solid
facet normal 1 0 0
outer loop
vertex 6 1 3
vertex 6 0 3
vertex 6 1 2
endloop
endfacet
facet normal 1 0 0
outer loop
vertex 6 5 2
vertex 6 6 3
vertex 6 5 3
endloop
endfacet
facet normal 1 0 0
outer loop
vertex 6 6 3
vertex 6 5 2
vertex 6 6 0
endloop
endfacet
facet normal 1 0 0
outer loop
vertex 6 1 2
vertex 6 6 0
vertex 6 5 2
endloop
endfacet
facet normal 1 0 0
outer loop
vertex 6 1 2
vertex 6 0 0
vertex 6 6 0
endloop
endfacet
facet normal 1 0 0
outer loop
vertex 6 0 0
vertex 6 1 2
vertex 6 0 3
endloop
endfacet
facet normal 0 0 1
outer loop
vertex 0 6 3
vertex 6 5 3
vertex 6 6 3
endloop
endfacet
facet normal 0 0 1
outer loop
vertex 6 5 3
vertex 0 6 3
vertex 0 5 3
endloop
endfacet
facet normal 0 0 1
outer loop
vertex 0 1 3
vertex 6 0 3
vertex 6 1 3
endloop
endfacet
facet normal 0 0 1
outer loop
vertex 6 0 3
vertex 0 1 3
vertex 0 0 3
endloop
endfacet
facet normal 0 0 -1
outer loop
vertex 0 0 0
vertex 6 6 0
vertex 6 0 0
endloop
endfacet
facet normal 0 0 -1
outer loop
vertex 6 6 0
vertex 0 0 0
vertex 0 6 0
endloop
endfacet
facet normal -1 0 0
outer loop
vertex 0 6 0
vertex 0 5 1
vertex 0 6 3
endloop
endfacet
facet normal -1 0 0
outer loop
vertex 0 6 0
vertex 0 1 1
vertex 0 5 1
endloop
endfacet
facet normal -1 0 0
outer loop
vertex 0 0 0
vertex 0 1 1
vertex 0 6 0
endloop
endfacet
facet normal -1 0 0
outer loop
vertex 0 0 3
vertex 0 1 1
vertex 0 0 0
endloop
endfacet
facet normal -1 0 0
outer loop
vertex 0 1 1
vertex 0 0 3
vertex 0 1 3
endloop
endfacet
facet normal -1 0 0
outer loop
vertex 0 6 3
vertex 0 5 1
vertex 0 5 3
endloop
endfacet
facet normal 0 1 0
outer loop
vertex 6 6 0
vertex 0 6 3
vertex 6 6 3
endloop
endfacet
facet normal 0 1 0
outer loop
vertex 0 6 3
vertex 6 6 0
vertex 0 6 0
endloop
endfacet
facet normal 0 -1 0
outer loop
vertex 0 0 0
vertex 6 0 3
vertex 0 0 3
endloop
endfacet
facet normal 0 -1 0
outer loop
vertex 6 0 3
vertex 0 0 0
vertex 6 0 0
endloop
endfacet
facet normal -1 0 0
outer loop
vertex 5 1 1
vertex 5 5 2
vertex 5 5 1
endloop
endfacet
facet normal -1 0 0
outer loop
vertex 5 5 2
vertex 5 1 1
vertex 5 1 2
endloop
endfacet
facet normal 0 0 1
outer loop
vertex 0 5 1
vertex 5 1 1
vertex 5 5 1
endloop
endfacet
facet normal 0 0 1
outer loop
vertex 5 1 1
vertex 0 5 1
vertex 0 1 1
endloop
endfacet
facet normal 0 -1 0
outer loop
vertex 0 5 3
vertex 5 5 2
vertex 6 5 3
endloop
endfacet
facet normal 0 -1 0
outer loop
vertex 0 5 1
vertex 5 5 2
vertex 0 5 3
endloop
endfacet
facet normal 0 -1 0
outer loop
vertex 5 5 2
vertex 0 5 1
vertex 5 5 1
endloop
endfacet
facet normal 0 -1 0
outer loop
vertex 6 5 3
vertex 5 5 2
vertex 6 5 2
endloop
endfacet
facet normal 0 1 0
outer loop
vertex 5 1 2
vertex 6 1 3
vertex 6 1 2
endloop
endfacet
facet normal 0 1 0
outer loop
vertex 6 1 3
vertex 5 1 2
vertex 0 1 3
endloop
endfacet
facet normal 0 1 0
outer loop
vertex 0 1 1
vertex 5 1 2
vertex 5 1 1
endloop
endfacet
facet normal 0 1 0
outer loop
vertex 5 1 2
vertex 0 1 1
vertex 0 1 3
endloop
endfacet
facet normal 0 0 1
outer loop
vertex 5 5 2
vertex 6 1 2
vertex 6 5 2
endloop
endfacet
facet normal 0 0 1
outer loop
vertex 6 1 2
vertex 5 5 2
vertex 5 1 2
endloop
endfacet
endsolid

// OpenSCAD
// file: defs.scad
w=210;
t1=10;
t3=20;
t=5;
a1=92.5;
a2=79.9;
a3=64.9;
b1=a1/2;
b2=a2;
b3=2*a3;
cds2=6;
cdst1=1;
cdst2=2;
cdst3=3;
// main file
include <defs.scad>

difference() {
cube([cds2,cds2,cdst3]);
translate([cdst1,cdst1,cdst1]) cube([cds2-2*cdst1,cds2-2*cdst1,cdst3-cdst1]);
translate([cds2-cdst1, cdst1, cdst3-cdst1]) cube([cds2-2*cdst1, cds2-2*cdst1, cdst1]);
translate([0, cdst1, cdst1]) cube([cdst1,cds2-2*cdst1, cdst3-cdst1]);
}
